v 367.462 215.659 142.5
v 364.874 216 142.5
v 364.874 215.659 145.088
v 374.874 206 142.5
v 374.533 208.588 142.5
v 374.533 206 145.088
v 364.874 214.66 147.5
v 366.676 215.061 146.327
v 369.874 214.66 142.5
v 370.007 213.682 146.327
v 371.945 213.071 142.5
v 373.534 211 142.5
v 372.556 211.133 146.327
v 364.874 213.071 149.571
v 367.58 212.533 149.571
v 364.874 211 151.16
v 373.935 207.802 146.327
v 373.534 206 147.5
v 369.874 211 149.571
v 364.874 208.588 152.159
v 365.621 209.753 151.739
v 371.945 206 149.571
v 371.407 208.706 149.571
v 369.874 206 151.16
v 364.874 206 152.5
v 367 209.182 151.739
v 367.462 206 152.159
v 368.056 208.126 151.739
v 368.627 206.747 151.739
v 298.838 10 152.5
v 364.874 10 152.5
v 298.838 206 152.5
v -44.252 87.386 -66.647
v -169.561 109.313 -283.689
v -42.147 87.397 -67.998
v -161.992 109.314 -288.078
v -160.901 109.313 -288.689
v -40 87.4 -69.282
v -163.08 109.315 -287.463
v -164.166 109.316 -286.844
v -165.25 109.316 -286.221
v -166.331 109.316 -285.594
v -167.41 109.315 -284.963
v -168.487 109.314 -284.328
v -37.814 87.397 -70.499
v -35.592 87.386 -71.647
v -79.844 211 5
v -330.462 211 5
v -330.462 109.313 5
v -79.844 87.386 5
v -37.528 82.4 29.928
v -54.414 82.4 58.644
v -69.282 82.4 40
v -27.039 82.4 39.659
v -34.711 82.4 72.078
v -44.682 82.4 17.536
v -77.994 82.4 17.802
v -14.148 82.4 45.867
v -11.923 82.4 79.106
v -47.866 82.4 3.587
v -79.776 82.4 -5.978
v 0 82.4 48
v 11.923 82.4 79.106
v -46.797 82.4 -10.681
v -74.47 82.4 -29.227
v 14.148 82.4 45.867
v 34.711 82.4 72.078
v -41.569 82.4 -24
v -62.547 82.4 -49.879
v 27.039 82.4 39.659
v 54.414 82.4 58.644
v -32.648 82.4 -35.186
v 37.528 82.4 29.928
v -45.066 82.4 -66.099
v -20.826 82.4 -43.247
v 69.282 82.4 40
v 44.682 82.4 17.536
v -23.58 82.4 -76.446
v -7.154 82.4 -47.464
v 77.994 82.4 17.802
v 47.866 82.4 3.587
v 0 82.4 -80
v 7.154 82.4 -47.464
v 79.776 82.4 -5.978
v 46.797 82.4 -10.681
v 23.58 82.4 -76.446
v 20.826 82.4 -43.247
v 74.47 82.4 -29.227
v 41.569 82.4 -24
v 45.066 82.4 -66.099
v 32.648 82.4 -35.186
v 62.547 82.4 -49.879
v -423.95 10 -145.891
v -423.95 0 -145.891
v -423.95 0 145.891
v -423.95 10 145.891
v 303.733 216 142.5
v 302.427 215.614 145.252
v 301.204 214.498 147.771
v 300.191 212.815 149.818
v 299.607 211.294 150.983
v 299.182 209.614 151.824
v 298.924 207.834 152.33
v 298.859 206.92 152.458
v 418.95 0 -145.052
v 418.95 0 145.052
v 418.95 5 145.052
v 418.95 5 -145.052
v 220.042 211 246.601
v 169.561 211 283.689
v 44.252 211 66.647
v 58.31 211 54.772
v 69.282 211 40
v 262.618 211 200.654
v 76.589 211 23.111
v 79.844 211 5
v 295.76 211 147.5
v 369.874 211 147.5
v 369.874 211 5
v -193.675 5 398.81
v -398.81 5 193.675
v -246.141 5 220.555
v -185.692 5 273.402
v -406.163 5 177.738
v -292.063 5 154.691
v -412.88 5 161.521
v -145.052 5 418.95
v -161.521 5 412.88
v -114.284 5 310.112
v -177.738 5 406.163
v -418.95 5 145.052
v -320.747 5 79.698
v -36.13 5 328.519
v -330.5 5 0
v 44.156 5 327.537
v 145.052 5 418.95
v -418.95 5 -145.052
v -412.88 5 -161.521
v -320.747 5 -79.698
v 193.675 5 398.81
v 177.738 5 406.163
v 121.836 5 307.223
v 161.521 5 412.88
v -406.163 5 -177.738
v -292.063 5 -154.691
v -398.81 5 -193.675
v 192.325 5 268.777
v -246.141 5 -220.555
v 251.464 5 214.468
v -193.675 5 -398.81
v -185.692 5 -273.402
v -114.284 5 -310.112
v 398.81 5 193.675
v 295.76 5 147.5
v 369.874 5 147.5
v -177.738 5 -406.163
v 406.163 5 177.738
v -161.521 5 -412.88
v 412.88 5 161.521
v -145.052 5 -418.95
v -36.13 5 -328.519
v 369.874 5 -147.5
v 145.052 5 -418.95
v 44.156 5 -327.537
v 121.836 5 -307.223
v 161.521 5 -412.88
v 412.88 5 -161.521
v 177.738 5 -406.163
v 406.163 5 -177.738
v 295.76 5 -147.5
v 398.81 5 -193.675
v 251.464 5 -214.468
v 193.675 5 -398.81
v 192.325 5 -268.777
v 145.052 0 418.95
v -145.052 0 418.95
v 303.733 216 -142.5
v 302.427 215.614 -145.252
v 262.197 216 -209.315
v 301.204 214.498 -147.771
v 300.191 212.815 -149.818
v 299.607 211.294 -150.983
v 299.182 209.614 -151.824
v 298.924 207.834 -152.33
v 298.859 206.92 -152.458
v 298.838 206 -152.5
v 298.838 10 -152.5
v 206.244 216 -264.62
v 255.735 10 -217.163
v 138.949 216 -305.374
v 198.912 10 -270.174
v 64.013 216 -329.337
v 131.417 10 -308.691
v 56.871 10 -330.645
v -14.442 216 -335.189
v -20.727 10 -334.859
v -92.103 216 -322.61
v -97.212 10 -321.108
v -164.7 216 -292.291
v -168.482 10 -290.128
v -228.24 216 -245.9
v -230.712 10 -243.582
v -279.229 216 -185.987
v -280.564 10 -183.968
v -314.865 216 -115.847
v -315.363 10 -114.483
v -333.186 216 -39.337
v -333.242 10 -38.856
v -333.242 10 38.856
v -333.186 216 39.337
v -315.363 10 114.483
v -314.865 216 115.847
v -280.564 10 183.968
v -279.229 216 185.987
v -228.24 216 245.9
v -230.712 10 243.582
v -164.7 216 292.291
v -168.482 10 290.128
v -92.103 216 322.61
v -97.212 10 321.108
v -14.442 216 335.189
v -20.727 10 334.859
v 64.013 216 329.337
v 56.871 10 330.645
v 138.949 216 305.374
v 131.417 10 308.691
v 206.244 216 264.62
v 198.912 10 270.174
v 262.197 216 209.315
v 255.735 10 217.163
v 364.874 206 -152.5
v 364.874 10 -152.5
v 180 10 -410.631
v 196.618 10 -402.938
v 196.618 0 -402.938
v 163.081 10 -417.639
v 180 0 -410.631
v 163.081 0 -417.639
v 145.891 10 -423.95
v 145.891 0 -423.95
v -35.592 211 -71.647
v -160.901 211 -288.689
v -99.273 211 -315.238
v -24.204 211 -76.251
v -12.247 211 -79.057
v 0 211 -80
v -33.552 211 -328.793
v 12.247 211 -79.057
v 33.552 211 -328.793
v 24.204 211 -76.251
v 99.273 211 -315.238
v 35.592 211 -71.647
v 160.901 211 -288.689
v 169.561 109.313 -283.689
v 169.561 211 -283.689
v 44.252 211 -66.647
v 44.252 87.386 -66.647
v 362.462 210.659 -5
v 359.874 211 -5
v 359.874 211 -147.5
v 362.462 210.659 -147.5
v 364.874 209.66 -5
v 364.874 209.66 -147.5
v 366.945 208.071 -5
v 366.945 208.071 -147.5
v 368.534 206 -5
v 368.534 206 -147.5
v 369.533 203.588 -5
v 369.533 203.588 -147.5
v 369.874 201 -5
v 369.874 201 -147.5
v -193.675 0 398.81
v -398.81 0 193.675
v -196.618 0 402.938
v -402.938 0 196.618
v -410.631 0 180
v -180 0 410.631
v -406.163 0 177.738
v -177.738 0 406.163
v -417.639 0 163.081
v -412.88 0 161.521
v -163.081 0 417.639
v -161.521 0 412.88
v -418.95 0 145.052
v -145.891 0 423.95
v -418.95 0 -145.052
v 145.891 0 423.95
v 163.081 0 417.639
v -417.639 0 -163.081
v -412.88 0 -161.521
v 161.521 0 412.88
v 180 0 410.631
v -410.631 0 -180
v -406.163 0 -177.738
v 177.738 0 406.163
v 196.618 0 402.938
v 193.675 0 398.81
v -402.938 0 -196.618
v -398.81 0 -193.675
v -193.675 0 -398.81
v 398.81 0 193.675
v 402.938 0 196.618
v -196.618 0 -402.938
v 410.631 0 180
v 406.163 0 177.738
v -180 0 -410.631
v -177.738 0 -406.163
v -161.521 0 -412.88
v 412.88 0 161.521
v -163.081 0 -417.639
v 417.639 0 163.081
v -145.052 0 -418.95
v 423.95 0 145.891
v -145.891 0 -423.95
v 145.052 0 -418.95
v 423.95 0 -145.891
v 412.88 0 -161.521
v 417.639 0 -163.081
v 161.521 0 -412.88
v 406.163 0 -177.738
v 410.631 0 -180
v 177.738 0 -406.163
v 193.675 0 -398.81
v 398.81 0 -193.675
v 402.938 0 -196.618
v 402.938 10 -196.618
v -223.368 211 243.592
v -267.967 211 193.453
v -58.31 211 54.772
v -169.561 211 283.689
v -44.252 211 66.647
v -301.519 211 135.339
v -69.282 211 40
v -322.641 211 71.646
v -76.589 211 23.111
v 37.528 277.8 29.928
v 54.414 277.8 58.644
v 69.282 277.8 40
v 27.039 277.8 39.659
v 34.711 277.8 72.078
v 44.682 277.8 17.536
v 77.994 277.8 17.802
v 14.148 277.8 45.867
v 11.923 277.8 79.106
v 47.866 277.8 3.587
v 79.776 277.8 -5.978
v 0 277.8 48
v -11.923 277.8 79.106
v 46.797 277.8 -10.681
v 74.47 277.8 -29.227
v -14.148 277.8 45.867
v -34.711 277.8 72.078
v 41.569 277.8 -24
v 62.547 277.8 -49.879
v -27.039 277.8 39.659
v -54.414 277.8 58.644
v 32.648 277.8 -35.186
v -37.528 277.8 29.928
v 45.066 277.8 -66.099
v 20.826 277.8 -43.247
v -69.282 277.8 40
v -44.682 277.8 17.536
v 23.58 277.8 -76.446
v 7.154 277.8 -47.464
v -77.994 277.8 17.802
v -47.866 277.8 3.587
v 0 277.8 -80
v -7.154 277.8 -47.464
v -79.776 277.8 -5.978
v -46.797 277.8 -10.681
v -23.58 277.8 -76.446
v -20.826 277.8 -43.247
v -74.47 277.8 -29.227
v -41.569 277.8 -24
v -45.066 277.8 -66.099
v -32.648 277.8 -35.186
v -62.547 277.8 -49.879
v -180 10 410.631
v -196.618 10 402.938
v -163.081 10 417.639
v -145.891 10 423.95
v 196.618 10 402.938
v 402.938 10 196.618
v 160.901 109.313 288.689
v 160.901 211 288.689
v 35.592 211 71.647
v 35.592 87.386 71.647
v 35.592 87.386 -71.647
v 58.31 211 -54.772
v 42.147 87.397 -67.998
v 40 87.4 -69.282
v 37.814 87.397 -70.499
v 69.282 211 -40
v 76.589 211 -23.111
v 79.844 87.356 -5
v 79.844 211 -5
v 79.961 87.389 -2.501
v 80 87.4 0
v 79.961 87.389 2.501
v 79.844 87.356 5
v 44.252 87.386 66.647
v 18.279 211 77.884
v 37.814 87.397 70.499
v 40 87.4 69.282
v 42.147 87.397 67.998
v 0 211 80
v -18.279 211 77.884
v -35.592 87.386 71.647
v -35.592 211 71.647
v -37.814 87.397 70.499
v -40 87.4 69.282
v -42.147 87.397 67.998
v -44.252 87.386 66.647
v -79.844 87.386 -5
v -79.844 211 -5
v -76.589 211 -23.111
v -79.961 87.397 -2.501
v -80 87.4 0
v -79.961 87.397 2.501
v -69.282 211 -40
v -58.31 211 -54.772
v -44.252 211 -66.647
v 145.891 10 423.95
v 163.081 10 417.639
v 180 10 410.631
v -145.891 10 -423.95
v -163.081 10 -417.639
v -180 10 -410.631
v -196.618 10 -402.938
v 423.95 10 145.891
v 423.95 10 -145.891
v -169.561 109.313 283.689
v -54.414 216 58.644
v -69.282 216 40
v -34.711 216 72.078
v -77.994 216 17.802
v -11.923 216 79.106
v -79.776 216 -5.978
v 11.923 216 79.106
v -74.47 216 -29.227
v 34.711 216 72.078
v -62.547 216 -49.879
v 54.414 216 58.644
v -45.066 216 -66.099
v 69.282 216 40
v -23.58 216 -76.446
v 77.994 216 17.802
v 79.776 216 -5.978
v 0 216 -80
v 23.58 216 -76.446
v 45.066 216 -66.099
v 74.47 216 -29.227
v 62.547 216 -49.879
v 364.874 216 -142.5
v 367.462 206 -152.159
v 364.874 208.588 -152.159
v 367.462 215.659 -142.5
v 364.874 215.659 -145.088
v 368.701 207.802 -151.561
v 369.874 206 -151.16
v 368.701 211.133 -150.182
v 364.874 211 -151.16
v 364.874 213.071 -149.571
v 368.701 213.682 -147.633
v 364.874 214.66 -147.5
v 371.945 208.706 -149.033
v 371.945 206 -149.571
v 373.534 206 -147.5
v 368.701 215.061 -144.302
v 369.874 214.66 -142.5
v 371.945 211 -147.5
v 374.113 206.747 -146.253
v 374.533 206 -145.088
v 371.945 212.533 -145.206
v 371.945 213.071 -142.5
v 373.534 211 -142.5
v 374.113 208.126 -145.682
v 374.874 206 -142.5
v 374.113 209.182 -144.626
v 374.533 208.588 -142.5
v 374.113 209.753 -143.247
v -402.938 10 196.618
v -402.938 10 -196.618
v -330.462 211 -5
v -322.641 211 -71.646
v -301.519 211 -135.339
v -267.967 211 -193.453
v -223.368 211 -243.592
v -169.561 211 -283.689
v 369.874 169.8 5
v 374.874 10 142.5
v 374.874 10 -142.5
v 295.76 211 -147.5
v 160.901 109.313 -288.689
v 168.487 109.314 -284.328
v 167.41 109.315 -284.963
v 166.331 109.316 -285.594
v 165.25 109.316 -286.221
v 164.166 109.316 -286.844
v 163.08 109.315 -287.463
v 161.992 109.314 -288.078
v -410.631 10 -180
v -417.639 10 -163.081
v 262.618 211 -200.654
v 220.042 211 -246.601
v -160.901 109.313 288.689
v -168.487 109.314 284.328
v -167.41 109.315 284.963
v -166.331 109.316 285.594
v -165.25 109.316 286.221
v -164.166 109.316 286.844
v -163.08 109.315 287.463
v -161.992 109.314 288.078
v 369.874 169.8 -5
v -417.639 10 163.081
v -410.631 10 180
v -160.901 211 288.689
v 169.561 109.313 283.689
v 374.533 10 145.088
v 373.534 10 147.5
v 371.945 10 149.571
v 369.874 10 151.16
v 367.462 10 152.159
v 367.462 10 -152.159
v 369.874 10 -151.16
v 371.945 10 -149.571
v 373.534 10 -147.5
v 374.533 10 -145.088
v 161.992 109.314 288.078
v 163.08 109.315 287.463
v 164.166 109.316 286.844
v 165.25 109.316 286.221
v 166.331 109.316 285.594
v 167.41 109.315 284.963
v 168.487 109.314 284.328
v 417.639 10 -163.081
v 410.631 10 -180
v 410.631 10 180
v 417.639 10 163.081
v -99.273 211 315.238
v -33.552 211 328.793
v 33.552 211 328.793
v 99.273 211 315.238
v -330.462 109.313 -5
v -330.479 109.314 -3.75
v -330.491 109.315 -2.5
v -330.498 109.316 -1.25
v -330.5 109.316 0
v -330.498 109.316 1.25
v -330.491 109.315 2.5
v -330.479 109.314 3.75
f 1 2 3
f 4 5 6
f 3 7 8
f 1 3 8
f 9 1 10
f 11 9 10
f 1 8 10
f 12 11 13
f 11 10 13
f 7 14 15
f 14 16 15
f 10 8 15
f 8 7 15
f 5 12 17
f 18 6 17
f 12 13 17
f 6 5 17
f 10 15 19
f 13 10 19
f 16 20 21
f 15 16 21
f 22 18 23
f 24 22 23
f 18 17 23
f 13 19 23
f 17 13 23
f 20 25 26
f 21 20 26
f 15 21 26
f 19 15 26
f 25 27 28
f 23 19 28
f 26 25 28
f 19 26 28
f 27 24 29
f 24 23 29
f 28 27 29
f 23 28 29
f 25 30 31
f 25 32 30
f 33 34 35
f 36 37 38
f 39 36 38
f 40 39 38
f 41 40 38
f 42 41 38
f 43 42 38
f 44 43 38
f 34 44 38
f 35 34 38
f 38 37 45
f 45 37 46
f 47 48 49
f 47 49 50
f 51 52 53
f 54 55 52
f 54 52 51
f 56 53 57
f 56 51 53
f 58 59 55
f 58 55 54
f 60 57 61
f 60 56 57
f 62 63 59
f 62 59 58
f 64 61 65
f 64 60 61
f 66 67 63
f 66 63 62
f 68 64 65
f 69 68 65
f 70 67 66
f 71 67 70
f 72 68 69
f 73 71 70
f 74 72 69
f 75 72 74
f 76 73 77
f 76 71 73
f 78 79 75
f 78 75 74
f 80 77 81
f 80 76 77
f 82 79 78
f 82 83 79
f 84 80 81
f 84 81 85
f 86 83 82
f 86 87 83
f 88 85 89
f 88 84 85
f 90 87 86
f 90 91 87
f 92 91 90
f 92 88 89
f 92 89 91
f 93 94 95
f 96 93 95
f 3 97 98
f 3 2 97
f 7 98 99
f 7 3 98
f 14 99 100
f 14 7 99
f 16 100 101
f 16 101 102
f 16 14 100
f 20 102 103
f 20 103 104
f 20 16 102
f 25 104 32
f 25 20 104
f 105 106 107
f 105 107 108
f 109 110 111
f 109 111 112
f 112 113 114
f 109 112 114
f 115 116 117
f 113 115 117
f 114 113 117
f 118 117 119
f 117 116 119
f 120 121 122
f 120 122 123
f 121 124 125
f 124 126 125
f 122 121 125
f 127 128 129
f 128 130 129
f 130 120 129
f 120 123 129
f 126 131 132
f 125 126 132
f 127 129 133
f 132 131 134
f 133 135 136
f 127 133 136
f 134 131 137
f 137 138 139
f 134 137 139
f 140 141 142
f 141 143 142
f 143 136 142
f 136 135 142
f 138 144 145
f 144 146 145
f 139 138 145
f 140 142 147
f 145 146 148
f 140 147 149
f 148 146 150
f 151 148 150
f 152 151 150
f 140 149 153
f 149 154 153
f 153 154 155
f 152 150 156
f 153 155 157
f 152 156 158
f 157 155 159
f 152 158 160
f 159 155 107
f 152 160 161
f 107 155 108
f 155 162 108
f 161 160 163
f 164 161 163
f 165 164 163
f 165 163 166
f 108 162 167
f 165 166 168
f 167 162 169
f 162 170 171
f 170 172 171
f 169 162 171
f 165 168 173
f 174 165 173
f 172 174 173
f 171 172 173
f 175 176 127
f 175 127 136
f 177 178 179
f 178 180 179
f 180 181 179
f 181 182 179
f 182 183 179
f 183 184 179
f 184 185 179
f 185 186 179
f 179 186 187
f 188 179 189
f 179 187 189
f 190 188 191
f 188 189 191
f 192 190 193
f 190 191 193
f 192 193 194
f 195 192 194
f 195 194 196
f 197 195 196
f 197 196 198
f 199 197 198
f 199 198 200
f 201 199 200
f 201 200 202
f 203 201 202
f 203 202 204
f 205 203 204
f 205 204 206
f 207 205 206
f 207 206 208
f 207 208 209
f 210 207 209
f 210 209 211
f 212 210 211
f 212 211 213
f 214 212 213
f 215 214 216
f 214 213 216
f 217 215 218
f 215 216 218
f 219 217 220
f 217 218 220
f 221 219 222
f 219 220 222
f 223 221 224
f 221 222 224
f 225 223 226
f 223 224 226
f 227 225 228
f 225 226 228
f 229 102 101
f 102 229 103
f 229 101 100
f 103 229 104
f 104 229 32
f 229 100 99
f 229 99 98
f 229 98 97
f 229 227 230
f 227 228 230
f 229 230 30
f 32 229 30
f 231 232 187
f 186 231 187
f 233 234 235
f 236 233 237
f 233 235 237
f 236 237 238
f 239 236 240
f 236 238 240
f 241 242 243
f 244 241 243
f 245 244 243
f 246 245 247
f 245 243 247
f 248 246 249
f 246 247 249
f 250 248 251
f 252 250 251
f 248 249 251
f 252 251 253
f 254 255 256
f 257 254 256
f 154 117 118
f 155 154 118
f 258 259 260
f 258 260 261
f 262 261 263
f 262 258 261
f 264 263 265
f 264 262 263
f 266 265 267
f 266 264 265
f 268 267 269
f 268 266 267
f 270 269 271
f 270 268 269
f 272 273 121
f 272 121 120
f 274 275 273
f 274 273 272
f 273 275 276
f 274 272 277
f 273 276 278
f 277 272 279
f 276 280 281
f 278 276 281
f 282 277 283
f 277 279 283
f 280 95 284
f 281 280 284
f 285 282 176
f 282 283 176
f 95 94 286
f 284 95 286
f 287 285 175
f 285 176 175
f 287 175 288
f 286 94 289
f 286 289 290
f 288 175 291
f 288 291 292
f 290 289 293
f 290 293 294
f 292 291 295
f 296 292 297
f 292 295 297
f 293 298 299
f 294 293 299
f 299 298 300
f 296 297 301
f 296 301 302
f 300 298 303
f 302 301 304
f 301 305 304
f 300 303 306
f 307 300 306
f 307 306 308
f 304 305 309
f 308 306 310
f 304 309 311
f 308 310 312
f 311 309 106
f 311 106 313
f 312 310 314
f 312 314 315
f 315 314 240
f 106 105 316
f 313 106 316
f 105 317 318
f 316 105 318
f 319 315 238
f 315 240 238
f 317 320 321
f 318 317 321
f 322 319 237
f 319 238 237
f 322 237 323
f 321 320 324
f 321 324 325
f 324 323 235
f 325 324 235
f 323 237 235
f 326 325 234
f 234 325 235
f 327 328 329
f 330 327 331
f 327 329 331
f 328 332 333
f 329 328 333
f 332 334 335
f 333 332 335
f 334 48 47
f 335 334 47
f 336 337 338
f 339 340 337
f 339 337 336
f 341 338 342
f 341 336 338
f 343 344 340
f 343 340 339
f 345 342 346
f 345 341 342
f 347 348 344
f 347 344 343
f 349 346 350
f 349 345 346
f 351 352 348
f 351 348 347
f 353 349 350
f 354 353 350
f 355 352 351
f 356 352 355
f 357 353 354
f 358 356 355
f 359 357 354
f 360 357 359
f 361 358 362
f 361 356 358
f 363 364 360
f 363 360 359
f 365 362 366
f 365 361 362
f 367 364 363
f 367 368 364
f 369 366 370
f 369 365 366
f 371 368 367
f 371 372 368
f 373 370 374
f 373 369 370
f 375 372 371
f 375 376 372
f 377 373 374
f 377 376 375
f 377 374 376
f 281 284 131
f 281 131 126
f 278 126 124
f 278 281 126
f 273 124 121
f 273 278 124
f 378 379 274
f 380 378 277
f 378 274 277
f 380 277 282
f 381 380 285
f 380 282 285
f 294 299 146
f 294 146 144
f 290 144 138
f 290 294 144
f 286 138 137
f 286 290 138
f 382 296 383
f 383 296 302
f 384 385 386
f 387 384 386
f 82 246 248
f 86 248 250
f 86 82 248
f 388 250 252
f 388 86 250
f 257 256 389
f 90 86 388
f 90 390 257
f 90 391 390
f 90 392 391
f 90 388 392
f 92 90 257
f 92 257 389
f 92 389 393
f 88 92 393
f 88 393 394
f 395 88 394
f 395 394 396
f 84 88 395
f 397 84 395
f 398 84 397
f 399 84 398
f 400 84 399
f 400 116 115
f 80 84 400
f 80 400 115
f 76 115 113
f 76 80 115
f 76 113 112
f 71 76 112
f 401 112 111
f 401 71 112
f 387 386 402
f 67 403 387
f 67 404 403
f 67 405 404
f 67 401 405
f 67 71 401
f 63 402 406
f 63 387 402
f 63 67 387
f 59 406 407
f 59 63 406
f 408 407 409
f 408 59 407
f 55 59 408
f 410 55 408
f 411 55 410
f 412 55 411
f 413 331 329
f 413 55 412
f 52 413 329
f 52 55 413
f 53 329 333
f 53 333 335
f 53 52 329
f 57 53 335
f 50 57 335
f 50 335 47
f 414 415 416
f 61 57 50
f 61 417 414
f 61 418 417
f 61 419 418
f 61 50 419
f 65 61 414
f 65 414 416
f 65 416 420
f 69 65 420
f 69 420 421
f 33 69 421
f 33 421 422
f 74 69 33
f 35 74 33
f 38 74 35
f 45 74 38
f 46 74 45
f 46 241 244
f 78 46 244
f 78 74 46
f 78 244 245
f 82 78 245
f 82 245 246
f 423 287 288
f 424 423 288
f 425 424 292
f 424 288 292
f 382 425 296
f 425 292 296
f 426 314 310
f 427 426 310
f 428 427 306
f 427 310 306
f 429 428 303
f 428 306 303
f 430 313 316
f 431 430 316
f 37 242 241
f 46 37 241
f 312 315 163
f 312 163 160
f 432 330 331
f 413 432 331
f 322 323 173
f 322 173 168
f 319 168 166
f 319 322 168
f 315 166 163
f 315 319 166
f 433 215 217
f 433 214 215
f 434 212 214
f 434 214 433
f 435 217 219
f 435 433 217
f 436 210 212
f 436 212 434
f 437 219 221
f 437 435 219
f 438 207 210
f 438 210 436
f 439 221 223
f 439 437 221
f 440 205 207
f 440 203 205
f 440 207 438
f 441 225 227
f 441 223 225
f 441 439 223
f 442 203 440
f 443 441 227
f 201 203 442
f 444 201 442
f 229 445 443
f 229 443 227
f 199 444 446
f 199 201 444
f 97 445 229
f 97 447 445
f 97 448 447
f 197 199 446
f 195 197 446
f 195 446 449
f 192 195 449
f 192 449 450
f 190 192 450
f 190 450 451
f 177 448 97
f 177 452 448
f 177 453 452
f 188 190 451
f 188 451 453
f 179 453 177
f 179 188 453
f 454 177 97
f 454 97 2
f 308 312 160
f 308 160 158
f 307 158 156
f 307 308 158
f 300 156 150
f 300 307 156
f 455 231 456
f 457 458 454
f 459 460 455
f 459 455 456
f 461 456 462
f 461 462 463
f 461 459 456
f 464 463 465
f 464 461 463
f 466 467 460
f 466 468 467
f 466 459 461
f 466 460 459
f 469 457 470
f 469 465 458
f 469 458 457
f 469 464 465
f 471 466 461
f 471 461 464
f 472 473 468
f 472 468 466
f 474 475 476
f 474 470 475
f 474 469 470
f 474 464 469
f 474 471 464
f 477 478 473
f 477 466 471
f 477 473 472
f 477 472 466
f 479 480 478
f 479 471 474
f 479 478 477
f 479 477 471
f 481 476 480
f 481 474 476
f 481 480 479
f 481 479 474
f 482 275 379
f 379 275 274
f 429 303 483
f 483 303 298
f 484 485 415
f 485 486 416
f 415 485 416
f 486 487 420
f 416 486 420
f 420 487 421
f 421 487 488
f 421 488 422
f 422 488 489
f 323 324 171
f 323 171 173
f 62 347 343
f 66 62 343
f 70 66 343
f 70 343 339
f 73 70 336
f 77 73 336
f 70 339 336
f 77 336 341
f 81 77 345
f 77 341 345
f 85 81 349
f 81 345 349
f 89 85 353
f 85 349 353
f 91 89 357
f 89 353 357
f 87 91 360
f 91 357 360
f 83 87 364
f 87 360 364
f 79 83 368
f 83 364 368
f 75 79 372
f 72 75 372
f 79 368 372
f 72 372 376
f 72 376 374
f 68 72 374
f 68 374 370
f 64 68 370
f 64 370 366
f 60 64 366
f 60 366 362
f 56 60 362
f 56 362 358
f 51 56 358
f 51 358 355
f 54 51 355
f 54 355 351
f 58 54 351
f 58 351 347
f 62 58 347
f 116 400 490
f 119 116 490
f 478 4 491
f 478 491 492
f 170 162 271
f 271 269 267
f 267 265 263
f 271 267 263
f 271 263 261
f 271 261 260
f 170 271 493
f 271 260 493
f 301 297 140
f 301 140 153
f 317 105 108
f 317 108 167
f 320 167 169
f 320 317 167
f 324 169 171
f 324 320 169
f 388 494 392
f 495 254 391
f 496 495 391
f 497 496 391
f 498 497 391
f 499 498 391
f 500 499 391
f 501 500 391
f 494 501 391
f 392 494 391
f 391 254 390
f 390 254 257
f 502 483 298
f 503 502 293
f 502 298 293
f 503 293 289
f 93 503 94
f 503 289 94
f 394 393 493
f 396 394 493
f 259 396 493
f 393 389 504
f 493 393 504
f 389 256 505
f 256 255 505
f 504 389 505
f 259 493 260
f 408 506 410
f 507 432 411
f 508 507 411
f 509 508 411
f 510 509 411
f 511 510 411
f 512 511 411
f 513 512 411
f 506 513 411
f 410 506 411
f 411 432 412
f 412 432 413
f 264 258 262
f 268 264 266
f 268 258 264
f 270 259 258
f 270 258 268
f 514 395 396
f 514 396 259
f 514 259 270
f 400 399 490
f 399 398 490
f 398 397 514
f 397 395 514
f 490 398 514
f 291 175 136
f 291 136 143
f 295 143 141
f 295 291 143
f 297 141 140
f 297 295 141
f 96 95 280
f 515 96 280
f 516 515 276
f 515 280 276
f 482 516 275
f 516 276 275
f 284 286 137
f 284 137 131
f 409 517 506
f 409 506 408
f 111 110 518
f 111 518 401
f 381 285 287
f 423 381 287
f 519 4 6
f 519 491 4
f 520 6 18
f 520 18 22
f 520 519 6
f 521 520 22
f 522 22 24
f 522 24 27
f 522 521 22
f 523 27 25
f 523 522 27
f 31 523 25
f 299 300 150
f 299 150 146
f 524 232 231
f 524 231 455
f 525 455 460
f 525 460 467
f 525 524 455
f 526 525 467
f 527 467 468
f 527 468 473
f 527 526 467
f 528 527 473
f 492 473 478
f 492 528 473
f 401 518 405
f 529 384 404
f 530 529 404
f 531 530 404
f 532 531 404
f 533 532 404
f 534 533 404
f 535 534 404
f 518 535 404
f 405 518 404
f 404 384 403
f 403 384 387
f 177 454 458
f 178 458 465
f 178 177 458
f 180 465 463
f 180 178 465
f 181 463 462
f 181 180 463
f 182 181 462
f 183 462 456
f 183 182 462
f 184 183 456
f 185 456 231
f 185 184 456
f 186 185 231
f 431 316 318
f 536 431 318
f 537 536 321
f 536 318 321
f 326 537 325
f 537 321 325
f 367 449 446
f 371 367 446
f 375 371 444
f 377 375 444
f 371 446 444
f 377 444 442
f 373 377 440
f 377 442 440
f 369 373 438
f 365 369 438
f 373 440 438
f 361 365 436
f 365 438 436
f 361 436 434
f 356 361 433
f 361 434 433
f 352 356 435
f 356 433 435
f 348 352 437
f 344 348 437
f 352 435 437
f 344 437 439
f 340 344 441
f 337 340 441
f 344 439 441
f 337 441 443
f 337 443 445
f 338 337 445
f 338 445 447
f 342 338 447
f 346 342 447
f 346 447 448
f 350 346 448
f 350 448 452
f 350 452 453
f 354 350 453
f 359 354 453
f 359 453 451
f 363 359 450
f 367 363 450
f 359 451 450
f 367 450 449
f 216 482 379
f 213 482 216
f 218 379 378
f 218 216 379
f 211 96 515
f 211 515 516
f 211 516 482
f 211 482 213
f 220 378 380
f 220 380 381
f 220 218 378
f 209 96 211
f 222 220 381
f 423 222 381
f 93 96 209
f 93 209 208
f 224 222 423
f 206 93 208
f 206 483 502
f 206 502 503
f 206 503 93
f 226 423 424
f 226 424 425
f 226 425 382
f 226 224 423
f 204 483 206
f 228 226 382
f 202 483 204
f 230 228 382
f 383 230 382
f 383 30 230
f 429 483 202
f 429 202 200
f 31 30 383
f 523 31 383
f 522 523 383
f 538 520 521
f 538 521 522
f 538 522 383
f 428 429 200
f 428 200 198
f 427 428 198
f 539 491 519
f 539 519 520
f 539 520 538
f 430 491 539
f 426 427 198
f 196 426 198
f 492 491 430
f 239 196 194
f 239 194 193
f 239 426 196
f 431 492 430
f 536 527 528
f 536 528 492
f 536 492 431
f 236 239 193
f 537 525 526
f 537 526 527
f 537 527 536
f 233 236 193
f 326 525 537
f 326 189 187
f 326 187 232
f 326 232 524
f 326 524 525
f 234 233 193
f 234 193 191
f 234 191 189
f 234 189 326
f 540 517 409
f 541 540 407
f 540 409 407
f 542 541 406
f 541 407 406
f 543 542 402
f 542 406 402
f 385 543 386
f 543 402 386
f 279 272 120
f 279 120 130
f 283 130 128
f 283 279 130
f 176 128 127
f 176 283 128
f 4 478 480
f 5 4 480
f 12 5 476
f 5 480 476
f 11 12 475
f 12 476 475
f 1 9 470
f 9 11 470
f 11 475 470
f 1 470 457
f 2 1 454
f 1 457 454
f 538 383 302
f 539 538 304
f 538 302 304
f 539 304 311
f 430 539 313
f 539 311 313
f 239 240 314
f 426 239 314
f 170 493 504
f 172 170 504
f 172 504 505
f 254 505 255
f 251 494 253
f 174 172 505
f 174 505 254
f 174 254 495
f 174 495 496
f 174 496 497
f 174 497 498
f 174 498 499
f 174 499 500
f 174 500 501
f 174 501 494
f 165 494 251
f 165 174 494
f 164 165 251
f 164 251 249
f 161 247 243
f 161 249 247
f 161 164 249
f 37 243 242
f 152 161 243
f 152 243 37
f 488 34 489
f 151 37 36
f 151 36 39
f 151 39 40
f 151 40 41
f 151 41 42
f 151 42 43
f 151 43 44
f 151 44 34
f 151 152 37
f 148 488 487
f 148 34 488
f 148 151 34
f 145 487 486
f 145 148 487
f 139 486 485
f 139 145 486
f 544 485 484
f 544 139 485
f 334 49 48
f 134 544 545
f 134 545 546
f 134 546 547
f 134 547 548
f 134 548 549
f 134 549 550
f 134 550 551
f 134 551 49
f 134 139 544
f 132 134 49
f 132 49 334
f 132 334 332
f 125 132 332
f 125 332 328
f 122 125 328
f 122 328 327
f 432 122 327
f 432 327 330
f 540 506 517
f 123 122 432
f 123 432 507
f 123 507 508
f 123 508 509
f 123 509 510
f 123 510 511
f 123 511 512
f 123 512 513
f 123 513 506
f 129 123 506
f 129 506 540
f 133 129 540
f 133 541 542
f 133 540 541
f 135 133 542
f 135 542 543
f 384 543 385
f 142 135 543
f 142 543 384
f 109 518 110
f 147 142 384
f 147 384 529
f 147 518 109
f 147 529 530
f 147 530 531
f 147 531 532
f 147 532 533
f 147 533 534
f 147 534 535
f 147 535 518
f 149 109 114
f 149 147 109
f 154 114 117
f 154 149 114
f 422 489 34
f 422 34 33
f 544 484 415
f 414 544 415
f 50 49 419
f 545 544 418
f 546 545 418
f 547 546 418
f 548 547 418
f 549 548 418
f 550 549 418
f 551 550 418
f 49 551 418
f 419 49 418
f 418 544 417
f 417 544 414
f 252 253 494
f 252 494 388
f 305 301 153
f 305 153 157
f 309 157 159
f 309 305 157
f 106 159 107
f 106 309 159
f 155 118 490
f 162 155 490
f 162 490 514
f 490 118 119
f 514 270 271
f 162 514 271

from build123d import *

# Parameters (mm, degrees)
EXTRUDE_1_DEPTH          = 10
SKETCH_2_R               = 335.5
EXTRUDE_2_DEPTH          = 206
EXTRUDE_3_REACH          = 639.278
SHELL_1_T                = -5
SKETCH_4_R               = 80
EXTRUDE_4_DEPTH          = 61.8
EXTRUDE_START            = 128.6
SKETCH_5_R               = 80
EXTRUDE_5_DEPTH          = 128.6
SKETCH_7_R               = 48
CUT_EXTRUDE_1_DEPTH      = 661.787443131
RIB_START                = -5
RIB_2_DEPTH              = 10
PATTERN_CIRCULAR_2_COUNT = 6
RIB_9_REACH              = 662.787
SKETCH_13_WALL_W         = 1624.932905634
SKETCH_13_WALL_H         = 10
FILLET_1_R               = 10
FILLET_2_R               = 10
FILLET_3_R               = 10


# Read off the part's stored shape, not the designer's step: 筋2
with BuildPart() as part:
    # 草图1 → 凸台-拉伸1 (new body)
    with BuildSketch(Plane(origin=(0, 0, 0), x_dir=(1, 0, 0), z_dir=(0, 1, 0))):
        with BuildLine():
            ThreePointArc((145.890781066, -423.95), (171.576116901, -414.221388401), (196.61755928, -402.938280488))
            Line((196.61755928, -402.938280488), (402.938280488, -196.61755928))
            ThreePointArc((402.938280488, -196.61755928), (414.221388401, -171.576116901), (423.95, -145.890781066))
            Line((423.95, -145.890781066), (423.95, 145.890781066))
            ThreePointArc((423.95, 145.890781066), (414.221388401, 171.576116901), (402.938280488, 196.61755928))
            Line((402.938280488, 196.61755928), (196.61755928, 402.938280488))
            ThreePointArc((196.61755928, 402.938280488), (171.576116901, 414.221388401), (145.890781066, 423.95))
            Line((145.890781066, 423.95), (-145.890781066, 423.95))
            ThreePointArc((-145.890781066, 423.95), (-171.576116901, 414.221388401), (-196.61755928, 402.938280488))
            Line((-196.61755928, 402.938280488), (-402.938280488, 196.61755928))
            ThreePointArc((-402.938280488, 196.61755928), (-414.221388401, 171.576116901), (-423.95, 145.890781066))
            Line((-423.95, 145.890781066), (-423.95, -145.890781066))
            ThreePointArc((-423.95, -145.890781066), (-414.221388401, -171.576116901), (-402.938280488, -196.61755928))
            Line((-402.938280488, -196.61755928), (-196.61755928, -402.938280488))
            ThreePointArc((-196.61755928, -402.938280488), (-171.576116901, -414.221388401), (-145.890781066, -423.95))
            Line((-145.890781066, -423.95), (145.890781066, -423.95))
        make_face()
    extrude(amount=EXTRUDE_1_DEPTH)

    # 草图2 → 凸台-拉伸2 (add)
    with BuildSketch(Plane(origin=(0, 10, 0), x_dir=(1, 0, 0), z_dir=(0, 1, 0))):
        with Locations(Location((0, 0, 0), (0, 0, 270))):
            Circle(SKETCH_2_R)
    extrude(amount=EXTRUDE_2_DEPTH)

    # 草图3 → 凸台-拉伸3 (add, up to next)
    with BuildSketch(Plane(origin=(0, 216, 0), x_dir=(1, 0, 0), z_dir=(0, 1, 0)), mode=Mode.PRIVATE) as extrude_3_sk1:
        with BuildLine():
            ThreePointArc((298.83774862, 152.5), (326.205697882, 78.422526541), (335.5, 0))
            Line((335.5, 0), (374.873930941, 0))
            Line((374.873930941, 0), (374.873930941, 152.5))
            Line((374.873930941, 152.5), (298.83774862, 152.5))
        make_face()
    extrude_3_tool1 = extrude(extrude_3_sk1.sketch, amount=-EXTRUDE_3_REACH, mode=Mode.PRIVATE) - part.part
    # 草图3 → 凸台-拉伸3 (add, up to next)
    with BuildSketch(Plane(origin=(0, 216, 0), x_dir=(1, 0, 0), z_dir=(0, 1, 0)), mode=Mode.PRIVATE) as extrude_3_sk2:
        with BuildLine():
            Line((374.873930941, 0), (335.5, 0))
            ThreePointArc((335.5, 0), (326.205697882, -78.422526541), (298.83774862, -152.5))
            Line((298.83774862, -152.5), (374.873930941, -152.5))
            Line((374.873930941, -152.5), (374.873930941, 0))
        make_face()
    extrude_3_tool2 = extrude(extrude_3_sk2.sketch, amount=-EXTRUDE_3_REACH, mode=Mode.PRIVATE) - part.part
    add(extrude_3_tool1.solids().sort_by_distance((348.072526, 216, -85.221274))[0])
    add(extrude_3_tool2.solids().sort_by_distance((348.072526, 216, 85.221274))[0])

    # 抽壳1
    shell_1_openings = [part.faces().sort_by_distance(p)[0] for p in [
        (0, 0, 0),
    ]]
    offset(amount=SHELL_1_T, openings=shell_1_openings, kind=Kind.INTERSECTION)

    # 草图4 → 凸台-拉伸4 (add)
    with BuildSketch(Plane(origin=(0, 216, 0), x_dir=(1, 0, 0), z_dir=(0, 1, 0))):
        with Locations(Location((0, 0, 0), (0, 0, 90))):
            Circle(SKETCH_4_R)
    extrude(amount=EXTRUDE_4_DEPTH)

    # 草图5 → 凸台-拉伸5 (add)
    with BuildSketch(Plane.XZ.offset(-211).offset(EXTRUDE_START)):
        with Locations(Location((0, 0, 0), (0, 0, 270))):
            Circle(SKETCH_5_R)
    extrude(amount=-EXTRUDE_5_DEPTH)

    # 草图7 → 切除-拉伸1 (cut, through all)
    with BuildSketch(Plane(origin=(0, 277.8, 0), x_dir=(1, 0, 0), z_dir=(0, 1, 0))):
        with Locations(Location((0, 0, 0), (0, 0, 270))):
            Circle(SKETCH_7_R)
    extrude(amount=-CUT_EXTRUDE_1_DEPTH, mode=Mode.SUBTRACT)

    # 筋2 outline → 筋2 (add)
    with BuildSketch(Plane.XY.offset(RIB_START)):
        Polygon((-330.5, 109.315910213), (-79.843597113, 87.38631652), (-78, 87.225022673), (-78, 211), (-332, 211), (-332, 109.447143208), align=None)
    rib_2 = extrude(amount=RIB_2_DEPTH)

    # 阵列(圆周)2: 筋2 ×6 about axis, 1 skipped
    pattern_circular_2_axis = Axis((0, 0, 0), (0, 1, 0))
    add([rib_2.rotate(pattern_circular_2_axis, i * 360 / PATTERN_CIRCULAR_2_COUNT) for i in range(1, PATTERN_CIRCULAR_2_COUNT) if i not in (3,)])

    # 草图13 wall → 筋9 (add, up to next)
    with BuildSketch(Plane(origin=(224.936965471, 128.6, 0), x_dir=(0.961892208962, 0.2734289274, 0), z_dir=(-0.2734289274, 0.961892208962, 0)), mode=Mode.PRIVATE) as rib_9_sk1:
        Rectangle(SKETCH_13_WALL_W, SKETCH_13_WALL_H)
    rib_9_tool1 = extrude(rib_9_sk1.sketch, amount=RIB_9_REACH, mode=Mode.PRIVATE) - part.part
    add(rib_9_tool1.solids().sort_by_distance((224.936965471, 128.6, 0))[0])

    # 圆角1
    fillet_1_edges = [part.edges().sort_by_distance(p)[0] for p in [
        (374.873930941, 113, -152.5),
        (336.85583978, 216, -152.5),
    ]]
    fillet(fillet_1_edges, radius=FILLET_1_R)

    # 圆角2
    # the kernel refuses this fillet: 10 mm, written as the material it adds along each edge
    with BuildSketch(Plane(origin=(369.873930941, 211, -5), x_dir=(-1, 0, 0), z_dir=(0, 0, -1))) as fillet_2_piece_1:
        with BuildLine():
            CenterArc((FILLET_2_R, -FILLET_2_R), FILLET_2_R, 90, 90)
            Line((0, -FILLET_2_R), (0, 0))
            Line((0, 0), (FILLET_2_R, 0))
        make_face()
    extrude(amount=142.5)
    # the kernel refuses this fillet: 10 mm, written as the material it takes off along each edge
    with BuildSketch(Plane(origin=(364.873930941, 206, -142.5), x_dir=(0, 1, 0), z_dir=(1, 0, 0))) as fillet_2_2_piece_1_section:
        Polygon((0, 0), (FILLET_2_R * 1.02, 0), (FILLET_2_R * 1.02, -FILLET_2_R * 1.02), (0, -FILLET_2_R * 1.02), align=None)
    fillet_2_2_piece_1 = extrude(amount=FILLET_2_R * 1.02, mode=Mode.PRIVATE)
    fillet_2_2_piece_1 = fillet_2_2_piece_1 - Plane(origin=(364.873930941, 206, -142.5), x_dir=(0, -0.7071067811865475, 0.7071067811865475), z_dir=(1, 0, 0)) * Sphere(FILLET_2_R, mode=Mode.PRIVATE)
    add(fillet_2_2_piece_1, mode=Mode.SUBTRACT)
    with BuildSketch(Plane(origin=(374.873930941, 216, -142.5), x_dir=(0, -1, 0), z_dir=(0, 0, 1))) as fillet_2_2_piece_2:
        with BuildLine():
            CenterArc((FILLET_2_R, -FILLET_2_R), FILLET_2_R, 90, 90)
            Line((0, -FILLET_2_R), (0, 0))
            Line((0, 0), (FILLET_2_R, 0))
        make_face()
    extrude(amount=320, mode=Mode.SUBTRACT)

    # 圆角3
    fillet_3_edges = [part.edges().sort_by_distance(p)[0] for p in [
        (331.85583978, 216, 152.5),
        (371.944998753, 213.071067812, 152.5),
        (374.873930941, 108, 152.5),
    ]]
    fillet(fillet_3_edges, radius=FILLET_3_R)


solid = part.part
